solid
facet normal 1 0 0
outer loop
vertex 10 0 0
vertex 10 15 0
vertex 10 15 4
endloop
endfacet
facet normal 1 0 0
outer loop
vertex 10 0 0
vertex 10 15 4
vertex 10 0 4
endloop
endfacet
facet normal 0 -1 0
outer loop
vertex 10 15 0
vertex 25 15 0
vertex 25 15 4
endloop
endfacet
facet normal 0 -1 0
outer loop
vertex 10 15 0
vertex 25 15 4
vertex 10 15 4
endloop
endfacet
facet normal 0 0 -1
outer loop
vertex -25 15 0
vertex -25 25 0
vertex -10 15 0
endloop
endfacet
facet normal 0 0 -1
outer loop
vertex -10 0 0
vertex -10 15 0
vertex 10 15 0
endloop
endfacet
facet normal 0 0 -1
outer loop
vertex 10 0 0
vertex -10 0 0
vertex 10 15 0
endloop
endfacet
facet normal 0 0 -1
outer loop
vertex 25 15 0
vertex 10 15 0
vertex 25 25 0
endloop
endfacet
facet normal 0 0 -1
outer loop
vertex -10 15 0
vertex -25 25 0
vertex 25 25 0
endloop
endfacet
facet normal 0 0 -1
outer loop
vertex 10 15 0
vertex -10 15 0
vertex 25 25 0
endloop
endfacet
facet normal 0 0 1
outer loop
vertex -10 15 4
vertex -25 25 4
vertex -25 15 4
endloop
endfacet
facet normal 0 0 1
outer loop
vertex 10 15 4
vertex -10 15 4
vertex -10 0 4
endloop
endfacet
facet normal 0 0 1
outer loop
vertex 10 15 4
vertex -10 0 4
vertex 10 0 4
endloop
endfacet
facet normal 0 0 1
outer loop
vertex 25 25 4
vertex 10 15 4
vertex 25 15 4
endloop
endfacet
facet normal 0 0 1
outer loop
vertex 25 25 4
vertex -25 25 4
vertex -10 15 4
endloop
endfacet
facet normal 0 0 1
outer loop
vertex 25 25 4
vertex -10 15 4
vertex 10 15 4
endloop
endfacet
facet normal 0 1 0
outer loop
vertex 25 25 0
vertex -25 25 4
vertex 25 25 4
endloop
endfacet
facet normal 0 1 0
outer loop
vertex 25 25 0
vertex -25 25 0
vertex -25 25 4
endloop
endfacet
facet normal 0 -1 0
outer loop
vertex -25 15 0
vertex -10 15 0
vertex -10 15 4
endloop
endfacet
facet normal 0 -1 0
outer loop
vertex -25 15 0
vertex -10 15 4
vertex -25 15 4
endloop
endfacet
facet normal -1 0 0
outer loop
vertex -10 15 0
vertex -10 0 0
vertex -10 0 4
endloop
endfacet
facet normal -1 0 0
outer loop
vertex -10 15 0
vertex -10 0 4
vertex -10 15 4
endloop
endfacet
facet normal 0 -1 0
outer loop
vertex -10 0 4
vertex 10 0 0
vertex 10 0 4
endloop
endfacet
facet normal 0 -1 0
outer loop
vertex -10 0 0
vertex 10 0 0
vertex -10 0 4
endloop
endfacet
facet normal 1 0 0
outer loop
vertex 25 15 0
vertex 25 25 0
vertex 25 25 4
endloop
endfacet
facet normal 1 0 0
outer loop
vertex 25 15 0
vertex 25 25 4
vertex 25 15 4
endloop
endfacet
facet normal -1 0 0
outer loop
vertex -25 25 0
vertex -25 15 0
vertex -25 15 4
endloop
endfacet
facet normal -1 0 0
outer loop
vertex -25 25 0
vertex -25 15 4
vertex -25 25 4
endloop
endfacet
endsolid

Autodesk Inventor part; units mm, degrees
ref_plane "YZ Plane" through (0, 0, 0) normal (1, 0, 0) x (0, 1, 0)
ref_plane "XZ Plane" through (0, 0, 0) normal (0, 1, 0) x (-1, 0, 0)
ref_plane "XY Plane" through (0, 0, 0) normal (0, 0, 1) x (1, 0, 0)
sketch "Sketch1" plane through (0, 0, 0) normal (0, 0, 1) x (1, 0, 0)
  line L0 (10, 0) -> (-10, 0)
  line L1 (-10, 0) -> (-10, 15)
  line L2 (-10, 15) -> (10, 15)
  line L3 (10, 15) -> (10, 0)
  line L4 (25, 15) -> (-25, 15)
  line L5 (-25, 15) -> (-25, 25)
  line L6 (-25, 25) -> (25, 25)
  line L7 (25, 25) -> (25, 15)
  point P0 (0, 0)
  point P1 (0, 0)
  point P2 (0, 15)
  point P3 (0, 15)
  point P4 (10, 15)
  dimension "d0" = 20
  dimension "d1" = 15
  dimension "d2" = 10
  dimension "d3" = 50
extrude "Extrusion1" add sketch "Sketch1" along normal blind 4
properties part number "Seguro"
